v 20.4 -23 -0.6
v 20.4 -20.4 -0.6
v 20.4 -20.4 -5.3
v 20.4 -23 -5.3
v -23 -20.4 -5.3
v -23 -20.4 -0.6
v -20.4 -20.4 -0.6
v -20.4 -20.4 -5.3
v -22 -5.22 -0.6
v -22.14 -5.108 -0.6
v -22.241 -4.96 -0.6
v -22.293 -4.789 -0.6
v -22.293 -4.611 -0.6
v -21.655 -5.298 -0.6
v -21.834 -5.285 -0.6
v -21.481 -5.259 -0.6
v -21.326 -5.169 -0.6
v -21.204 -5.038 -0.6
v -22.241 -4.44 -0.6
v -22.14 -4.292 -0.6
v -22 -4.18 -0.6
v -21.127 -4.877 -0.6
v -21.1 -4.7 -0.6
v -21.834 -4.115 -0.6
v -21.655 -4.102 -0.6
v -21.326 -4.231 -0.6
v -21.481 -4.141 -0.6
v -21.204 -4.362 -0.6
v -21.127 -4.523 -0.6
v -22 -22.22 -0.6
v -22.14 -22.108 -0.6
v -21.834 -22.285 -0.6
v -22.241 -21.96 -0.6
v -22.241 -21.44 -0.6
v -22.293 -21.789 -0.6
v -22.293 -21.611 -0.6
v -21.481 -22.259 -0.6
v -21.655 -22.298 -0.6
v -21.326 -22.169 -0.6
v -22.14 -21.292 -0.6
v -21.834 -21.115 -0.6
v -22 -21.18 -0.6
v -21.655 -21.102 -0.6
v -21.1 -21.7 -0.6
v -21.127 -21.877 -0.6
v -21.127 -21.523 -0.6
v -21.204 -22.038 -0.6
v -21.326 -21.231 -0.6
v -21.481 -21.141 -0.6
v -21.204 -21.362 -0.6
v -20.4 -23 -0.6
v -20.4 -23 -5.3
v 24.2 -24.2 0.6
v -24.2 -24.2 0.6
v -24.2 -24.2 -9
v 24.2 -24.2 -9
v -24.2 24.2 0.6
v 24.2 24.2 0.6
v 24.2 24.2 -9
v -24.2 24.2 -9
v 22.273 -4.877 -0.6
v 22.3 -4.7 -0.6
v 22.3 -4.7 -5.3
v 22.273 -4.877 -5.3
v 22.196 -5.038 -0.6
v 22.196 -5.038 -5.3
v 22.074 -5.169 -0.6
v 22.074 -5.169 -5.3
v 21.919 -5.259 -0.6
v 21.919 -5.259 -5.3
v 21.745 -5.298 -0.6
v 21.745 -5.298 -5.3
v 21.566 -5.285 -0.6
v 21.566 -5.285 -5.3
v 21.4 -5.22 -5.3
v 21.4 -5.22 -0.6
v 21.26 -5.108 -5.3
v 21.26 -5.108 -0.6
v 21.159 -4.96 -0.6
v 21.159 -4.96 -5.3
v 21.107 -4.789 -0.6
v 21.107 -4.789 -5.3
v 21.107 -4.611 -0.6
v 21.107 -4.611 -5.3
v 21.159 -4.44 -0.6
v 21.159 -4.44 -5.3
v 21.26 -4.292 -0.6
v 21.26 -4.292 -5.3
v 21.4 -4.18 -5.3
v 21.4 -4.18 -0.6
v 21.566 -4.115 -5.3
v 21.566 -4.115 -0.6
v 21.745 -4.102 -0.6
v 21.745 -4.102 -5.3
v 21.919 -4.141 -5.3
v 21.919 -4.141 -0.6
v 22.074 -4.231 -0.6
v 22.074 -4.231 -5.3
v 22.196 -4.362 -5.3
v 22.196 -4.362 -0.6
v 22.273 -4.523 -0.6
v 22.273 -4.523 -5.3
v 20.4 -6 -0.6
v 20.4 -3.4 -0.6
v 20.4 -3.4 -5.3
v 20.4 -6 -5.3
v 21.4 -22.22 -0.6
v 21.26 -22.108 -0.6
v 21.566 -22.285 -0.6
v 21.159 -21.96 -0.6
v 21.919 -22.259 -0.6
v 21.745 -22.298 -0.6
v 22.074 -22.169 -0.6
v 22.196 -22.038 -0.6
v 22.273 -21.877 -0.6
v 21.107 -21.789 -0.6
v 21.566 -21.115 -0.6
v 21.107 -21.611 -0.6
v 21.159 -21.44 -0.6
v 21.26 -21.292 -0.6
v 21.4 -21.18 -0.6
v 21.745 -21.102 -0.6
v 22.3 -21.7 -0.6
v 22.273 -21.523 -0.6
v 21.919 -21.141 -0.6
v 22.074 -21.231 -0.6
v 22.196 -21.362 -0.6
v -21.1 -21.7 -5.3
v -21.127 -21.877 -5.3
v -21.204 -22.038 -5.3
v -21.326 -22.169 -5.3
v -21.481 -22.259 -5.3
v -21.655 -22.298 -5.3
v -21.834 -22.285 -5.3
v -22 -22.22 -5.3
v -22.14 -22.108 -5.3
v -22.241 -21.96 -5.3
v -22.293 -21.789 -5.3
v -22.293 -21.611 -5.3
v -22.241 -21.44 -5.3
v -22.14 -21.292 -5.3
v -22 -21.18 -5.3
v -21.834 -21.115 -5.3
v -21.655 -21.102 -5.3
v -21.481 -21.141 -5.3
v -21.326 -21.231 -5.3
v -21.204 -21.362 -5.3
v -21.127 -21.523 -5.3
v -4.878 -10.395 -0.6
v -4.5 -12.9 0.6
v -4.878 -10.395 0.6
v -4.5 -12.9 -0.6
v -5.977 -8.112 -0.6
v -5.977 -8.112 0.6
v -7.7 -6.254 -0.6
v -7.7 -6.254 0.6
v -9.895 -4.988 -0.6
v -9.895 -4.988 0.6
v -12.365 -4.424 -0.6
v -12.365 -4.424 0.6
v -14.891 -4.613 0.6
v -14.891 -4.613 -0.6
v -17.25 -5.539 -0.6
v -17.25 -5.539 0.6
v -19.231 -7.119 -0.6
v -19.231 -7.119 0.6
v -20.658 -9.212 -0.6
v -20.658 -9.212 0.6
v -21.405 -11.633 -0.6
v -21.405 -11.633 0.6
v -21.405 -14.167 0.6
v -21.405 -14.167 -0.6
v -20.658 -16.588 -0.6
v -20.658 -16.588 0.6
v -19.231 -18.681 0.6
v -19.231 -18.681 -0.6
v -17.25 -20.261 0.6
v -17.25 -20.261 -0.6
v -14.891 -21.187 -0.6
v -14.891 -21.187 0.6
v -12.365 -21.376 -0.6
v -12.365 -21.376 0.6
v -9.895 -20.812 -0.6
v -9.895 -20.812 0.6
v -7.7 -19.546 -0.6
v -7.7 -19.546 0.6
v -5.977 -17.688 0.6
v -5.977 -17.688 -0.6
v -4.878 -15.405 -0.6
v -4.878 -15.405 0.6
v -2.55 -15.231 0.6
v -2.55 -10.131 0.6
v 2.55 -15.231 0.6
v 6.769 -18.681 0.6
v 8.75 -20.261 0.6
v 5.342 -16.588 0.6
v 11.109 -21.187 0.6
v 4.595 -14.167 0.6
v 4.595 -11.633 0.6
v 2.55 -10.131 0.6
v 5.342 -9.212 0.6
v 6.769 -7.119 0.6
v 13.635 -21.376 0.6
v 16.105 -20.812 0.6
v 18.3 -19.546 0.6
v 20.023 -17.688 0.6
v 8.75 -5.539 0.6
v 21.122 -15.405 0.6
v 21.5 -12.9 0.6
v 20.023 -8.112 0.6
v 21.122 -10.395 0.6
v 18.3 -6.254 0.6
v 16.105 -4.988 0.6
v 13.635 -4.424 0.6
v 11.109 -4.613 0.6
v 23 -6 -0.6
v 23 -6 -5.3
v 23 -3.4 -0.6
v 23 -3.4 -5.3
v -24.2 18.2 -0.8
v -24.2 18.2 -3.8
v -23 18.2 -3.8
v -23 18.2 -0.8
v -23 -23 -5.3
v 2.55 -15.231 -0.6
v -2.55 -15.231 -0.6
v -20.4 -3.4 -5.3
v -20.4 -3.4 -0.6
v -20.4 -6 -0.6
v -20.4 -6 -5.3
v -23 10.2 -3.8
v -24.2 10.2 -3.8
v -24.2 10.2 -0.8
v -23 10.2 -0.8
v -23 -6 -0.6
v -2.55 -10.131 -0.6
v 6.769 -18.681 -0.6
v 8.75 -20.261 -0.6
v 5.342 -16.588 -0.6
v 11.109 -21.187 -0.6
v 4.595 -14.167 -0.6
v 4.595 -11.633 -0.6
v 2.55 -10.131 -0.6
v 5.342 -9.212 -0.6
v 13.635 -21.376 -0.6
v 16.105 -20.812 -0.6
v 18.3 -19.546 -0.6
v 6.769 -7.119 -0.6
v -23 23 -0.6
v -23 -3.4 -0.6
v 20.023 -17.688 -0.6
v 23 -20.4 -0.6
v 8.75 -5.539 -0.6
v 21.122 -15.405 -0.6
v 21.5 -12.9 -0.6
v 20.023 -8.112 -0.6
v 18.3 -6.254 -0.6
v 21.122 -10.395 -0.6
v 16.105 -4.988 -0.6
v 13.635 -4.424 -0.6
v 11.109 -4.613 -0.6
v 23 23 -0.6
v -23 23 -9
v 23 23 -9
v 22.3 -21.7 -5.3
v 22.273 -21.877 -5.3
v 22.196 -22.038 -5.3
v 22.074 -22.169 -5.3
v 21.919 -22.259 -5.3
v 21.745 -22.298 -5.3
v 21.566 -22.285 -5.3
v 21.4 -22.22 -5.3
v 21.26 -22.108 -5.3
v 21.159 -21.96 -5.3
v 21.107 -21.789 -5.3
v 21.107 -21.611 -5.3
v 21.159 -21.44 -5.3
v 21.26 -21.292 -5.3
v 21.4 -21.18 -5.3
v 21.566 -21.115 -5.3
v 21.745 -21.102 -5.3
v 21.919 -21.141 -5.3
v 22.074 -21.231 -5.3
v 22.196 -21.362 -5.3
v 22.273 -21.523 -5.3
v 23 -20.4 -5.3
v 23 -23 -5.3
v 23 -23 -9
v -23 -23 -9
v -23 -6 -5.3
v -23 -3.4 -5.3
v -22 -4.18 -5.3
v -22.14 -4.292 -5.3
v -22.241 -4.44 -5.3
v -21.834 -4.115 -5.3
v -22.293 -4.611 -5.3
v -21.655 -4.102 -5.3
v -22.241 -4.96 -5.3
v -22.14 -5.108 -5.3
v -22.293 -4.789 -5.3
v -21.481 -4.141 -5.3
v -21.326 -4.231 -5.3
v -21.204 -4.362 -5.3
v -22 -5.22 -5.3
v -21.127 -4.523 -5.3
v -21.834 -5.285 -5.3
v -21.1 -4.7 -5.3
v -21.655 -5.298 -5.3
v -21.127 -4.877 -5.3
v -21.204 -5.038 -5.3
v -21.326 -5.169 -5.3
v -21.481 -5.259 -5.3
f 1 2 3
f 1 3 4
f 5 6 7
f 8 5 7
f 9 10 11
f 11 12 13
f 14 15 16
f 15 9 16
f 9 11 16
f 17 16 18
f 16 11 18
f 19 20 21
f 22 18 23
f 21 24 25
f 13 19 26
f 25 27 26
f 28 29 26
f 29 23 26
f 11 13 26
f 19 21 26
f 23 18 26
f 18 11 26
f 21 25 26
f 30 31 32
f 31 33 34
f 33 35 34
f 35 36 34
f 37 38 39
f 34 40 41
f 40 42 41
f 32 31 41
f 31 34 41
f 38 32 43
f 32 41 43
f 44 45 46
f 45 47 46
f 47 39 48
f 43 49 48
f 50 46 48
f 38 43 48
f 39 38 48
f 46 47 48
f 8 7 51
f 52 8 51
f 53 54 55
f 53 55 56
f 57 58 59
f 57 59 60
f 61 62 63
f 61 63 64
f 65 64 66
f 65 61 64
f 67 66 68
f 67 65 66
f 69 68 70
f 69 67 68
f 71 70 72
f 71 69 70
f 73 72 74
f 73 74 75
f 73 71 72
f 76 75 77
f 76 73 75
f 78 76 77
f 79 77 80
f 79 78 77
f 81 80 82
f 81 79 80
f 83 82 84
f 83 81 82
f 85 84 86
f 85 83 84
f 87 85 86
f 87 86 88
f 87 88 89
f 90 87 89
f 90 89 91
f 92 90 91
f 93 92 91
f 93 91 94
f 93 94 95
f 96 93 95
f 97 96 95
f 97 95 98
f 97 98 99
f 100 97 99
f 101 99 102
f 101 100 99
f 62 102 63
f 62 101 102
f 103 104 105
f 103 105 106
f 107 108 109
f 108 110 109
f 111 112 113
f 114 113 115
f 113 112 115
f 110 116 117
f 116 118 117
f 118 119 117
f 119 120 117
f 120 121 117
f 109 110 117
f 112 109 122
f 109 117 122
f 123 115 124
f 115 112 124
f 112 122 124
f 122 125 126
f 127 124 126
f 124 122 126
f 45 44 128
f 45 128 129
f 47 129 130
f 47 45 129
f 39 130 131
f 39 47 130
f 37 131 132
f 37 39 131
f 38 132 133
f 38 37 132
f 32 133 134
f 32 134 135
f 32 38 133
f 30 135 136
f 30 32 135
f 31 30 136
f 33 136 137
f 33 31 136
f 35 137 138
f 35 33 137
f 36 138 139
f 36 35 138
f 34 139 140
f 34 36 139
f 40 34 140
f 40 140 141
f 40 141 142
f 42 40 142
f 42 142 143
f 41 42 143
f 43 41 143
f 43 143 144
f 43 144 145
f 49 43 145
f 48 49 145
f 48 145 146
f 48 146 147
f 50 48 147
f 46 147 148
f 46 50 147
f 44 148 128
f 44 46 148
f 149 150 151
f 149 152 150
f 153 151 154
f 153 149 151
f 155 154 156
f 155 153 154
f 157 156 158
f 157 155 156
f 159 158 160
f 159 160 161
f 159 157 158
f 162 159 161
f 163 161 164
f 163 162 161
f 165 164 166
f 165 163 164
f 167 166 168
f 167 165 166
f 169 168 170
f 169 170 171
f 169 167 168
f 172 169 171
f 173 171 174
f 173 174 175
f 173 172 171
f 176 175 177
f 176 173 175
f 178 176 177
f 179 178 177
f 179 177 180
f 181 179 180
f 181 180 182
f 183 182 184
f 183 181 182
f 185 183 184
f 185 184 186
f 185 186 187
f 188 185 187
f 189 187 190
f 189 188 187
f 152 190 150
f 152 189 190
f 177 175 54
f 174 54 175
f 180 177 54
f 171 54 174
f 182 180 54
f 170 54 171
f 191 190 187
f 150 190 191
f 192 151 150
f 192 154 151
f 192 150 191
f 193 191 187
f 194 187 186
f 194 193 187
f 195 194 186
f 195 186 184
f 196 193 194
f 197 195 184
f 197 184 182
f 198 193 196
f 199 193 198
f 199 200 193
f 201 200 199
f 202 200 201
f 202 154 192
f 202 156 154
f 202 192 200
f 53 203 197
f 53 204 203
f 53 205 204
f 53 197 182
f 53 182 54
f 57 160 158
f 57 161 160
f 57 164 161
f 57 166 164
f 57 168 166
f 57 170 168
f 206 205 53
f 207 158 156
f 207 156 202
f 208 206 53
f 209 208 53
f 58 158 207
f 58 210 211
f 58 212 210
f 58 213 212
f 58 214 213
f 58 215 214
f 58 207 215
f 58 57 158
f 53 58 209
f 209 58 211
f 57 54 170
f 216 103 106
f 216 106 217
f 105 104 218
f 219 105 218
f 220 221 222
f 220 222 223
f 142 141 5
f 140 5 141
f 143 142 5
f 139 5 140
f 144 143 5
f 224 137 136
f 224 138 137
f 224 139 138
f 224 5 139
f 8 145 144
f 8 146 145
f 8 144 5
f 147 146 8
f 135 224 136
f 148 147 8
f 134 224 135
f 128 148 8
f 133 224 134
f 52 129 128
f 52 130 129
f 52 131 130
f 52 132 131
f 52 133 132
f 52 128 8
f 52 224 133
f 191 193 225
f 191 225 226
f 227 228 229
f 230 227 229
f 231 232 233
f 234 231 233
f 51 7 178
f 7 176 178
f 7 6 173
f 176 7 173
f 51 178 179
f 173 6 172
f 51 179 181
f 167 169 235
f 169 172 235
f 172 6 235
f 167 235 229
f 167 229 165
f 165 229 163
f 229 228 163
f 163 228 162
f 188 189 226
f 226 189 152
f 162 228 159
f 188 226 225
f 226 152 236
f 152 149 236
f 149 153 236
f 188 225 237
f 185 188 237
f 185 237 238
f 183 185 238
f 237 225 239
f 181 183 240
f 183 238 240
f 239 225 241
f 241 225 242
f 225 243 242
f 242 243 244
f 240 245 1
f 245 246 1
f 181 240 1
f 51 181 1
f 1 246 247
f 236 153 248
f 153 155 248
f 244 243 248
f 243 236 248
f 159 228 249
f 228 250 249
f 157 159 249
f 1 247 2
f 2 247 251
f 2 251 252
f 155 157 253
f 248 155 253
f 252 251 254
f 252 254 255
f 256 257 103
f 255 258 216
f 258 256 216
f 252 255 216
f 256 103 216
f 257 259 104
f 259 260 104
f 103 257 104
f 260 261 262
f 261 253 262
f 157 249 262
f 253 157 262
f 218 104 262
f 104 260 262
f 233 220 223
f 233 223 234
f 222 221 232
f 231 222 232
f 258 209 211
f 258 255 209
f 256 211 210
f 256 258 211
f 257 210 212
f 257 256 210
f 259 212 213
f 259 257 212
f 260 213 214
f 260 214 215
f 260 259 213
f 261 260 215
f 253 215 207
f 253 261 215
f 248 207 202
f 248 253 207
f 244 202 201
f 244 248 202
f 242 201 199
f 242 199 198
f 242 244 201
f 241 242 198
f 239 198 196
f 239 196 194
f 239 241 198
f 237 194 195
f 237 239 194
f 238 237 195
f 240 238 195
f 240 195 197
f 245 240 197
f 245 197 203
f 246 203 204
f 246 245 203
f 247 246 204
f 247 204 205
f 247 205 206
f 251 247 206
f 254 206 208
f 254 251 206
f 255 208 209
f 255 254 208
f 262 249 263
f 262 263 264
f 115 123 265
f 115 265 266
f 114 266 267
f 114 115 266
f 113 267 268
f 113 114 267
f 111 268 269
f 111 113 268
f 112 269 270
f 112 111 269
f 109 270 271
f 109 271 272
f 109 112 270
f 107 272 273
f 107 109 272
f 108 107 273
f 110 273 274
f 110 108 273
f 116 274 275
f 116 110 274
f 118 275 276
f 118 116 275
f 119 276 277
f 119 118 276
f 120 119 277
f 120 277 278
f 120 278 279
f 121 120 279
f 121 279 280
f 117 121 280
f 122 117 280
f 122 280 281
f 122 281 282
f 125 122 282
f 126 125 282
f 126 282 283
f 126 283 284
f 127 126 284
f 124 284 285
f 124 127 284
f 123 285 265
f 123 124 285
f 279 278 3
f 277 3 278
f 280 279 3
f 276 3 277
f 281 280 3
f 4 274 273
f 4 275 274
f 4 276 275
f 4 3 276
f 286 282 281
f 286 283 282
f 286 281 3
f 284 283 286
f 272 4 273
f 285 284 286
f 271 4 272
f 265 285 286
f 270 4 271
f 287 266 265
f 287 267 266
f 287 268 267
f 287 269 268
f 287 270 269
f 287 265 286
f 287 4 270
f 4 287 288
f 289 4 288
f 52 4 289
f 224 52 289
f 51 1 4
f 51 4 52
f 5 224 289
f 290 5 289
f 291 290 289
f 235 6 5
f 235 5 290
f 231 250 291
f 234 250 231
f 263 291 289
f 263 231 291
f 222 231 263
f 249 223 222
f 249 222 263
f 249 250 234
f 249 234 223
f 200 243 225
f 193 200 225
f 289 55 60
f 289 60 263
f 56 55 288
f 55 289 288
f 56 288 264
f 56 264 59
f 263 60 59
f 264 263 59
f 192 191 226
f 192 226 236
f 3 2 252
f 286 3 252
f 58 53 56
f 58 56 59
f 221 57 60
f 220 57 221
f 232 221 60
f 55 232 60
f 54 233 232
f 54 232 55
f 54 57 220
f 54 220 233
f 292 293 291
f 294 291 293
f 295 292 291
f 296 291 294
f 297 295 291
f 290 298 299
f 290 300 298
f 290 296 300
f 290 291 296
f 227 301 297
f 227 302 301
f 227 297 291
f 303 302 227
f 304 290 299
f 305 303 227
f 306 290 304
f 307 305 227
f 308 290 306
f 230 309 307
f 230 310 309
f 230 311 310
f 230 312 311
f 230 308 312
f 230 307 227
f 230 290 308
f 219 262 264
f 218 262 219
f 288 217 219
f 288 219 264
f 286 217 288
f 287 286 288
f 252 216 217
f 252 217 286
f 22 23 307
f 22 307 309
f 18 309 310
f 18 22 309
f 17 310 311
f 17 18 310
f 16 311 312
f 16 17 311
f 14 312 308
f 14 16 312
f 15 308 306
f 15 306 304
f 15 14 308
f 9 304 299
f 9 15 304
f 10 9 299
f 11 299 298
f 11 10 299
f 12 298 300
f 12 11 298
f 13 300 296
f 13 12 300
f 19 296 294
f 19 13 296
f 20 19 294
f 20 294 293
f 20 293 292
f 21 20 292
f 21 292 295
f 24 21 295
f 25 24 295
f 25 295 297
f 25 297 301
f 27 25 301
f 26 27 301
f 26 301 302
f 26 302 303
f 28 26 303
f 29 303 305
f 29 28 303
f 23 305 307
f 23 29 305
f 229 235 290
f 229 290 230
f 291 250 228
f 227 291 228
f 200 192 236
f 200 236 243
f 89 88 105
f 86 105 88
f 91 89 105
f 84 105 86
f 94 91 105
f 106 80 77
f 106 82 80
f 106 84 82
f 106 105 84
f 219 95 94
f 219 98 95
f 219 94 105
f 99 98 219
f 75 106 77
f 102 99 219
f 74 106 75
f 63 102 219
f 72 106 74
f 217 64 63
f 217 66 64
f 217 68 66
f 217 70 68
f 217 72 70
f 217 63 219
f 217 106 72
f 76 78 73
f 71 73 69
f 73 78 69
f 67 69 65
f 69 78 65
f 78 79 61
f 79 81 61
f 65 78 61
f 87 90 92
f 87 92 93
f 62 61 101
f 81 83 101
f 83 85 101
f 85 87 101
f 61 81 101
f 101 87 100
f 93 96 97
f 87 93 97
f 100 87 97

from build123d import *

# Parameters (mm, degrees)
F0_W     = 23
F0_H     = 23
F0_R     = 8.5
F1_DEPTH = 0.6
F3_DEPTH = 9.6
F4_W     = 2.6
F4_H     = 2.6
F4_R     = 0.6
F5_DEPTH = 4.7
F6_W     = 8
F6_H     = 3
F7_DEPTH = 1.4


with BuildPart() as f1:
    # F0 (on Top) → F1 (new body, symmetric)
    with BuildSketch(Plane.XY):
        with Locations((-11.5, 11.5)):
            Rectangle(F0_W, F0_H)
        Polygon((0, -10.131208), (0, 0), (-23, 0), (-23, -23), (0, -23), (0, -15.231208), (-2.55, -15.231208), (-2.55, -10.131208), align=None)
        with Locations((-13, -12.9)):
            Circle(F0_R, mode=Mode.SUBTRACT)
        with Locations((11.5, 11.5)):
            Rectangle(F0_W, F0_H)
        Polygon((23, 0), (0, 0), (0, -10.131208), (2.55, -10.131208), (2.55, -15.231208), (0, -15.231208), (0, -23), (23, -23), align=None)
        with Locations((13, -12.9)):
            Circle(F0_R, mode=Mode.SUBTRACT)
    extrude(amount=F1_DEPTH, both=True)

    # F2 (on face) → F3 (join)
    with BuildSketch(Plane.XY.offset(0.6)):
        Polygon((-23, 23), (0, 23), (0, 24.2), (-24.2, 24.2), (-24.2, -24.2), (0, -24.2), (0, -23), (-23, -23), align=None)
        Polygon((0, 23), (23, 23), (23, -23), (0, -23), (0, -24.2), (24.2, -24.2), (24.2, 24.2), (0, 24.2), align=None)
    extrude(amount=-F3_DEPTH)

    # F4 (on face) → F5 (join)
    with BuildSketch(Plane(origin=(0, 0, -0.6), x_dir=(1, 0, 0), z_dir=(0, 0, -1))):
        with Locations((21.7, 21.7)):
            Rectangle(F4_W, F4_H)
        with Locations((21.7, 21.7)):
            Circle(F4_R, mode=Mode.SUBTRACT)
        with Locations((-21.7, 21.7)):
            Rectangle(F4_W, F4_H)
        with Locations((-21.7, 21.7)):
            Circle(F4_R, mode=Mode.SUBTRACT)
        with Locations((-21.7, 4.7)):
            Rectangle(F4_W, F4_H)
        with Locations((-21.7, 4.7)):
            Circle(F4_R, mode=Mode.SUBTRACT)
        with Locations((21.7, 4.7)):
            Rectangle(F4_W, F4_H)
        with Locations((21.7, 4.7)):
            Circle(F4_R, mode=Mode.SUBTRACT)
    extrude(amount=F5_DEPTH)

    # F6 (on face) → F7 (cut)
    with BuildSketch(Plane(origin=(-24.2, 0, 0), x_dir=(0, -1, 0), z_dir=(-1, 0, 0))):
        with Locations((-14.2, -2.3)):
            Rectangle(F6_W, F6_H)
    extrude(amount=-F7_DEPTH, mode=Mode.SUBTRACT)


solid = f1.part
